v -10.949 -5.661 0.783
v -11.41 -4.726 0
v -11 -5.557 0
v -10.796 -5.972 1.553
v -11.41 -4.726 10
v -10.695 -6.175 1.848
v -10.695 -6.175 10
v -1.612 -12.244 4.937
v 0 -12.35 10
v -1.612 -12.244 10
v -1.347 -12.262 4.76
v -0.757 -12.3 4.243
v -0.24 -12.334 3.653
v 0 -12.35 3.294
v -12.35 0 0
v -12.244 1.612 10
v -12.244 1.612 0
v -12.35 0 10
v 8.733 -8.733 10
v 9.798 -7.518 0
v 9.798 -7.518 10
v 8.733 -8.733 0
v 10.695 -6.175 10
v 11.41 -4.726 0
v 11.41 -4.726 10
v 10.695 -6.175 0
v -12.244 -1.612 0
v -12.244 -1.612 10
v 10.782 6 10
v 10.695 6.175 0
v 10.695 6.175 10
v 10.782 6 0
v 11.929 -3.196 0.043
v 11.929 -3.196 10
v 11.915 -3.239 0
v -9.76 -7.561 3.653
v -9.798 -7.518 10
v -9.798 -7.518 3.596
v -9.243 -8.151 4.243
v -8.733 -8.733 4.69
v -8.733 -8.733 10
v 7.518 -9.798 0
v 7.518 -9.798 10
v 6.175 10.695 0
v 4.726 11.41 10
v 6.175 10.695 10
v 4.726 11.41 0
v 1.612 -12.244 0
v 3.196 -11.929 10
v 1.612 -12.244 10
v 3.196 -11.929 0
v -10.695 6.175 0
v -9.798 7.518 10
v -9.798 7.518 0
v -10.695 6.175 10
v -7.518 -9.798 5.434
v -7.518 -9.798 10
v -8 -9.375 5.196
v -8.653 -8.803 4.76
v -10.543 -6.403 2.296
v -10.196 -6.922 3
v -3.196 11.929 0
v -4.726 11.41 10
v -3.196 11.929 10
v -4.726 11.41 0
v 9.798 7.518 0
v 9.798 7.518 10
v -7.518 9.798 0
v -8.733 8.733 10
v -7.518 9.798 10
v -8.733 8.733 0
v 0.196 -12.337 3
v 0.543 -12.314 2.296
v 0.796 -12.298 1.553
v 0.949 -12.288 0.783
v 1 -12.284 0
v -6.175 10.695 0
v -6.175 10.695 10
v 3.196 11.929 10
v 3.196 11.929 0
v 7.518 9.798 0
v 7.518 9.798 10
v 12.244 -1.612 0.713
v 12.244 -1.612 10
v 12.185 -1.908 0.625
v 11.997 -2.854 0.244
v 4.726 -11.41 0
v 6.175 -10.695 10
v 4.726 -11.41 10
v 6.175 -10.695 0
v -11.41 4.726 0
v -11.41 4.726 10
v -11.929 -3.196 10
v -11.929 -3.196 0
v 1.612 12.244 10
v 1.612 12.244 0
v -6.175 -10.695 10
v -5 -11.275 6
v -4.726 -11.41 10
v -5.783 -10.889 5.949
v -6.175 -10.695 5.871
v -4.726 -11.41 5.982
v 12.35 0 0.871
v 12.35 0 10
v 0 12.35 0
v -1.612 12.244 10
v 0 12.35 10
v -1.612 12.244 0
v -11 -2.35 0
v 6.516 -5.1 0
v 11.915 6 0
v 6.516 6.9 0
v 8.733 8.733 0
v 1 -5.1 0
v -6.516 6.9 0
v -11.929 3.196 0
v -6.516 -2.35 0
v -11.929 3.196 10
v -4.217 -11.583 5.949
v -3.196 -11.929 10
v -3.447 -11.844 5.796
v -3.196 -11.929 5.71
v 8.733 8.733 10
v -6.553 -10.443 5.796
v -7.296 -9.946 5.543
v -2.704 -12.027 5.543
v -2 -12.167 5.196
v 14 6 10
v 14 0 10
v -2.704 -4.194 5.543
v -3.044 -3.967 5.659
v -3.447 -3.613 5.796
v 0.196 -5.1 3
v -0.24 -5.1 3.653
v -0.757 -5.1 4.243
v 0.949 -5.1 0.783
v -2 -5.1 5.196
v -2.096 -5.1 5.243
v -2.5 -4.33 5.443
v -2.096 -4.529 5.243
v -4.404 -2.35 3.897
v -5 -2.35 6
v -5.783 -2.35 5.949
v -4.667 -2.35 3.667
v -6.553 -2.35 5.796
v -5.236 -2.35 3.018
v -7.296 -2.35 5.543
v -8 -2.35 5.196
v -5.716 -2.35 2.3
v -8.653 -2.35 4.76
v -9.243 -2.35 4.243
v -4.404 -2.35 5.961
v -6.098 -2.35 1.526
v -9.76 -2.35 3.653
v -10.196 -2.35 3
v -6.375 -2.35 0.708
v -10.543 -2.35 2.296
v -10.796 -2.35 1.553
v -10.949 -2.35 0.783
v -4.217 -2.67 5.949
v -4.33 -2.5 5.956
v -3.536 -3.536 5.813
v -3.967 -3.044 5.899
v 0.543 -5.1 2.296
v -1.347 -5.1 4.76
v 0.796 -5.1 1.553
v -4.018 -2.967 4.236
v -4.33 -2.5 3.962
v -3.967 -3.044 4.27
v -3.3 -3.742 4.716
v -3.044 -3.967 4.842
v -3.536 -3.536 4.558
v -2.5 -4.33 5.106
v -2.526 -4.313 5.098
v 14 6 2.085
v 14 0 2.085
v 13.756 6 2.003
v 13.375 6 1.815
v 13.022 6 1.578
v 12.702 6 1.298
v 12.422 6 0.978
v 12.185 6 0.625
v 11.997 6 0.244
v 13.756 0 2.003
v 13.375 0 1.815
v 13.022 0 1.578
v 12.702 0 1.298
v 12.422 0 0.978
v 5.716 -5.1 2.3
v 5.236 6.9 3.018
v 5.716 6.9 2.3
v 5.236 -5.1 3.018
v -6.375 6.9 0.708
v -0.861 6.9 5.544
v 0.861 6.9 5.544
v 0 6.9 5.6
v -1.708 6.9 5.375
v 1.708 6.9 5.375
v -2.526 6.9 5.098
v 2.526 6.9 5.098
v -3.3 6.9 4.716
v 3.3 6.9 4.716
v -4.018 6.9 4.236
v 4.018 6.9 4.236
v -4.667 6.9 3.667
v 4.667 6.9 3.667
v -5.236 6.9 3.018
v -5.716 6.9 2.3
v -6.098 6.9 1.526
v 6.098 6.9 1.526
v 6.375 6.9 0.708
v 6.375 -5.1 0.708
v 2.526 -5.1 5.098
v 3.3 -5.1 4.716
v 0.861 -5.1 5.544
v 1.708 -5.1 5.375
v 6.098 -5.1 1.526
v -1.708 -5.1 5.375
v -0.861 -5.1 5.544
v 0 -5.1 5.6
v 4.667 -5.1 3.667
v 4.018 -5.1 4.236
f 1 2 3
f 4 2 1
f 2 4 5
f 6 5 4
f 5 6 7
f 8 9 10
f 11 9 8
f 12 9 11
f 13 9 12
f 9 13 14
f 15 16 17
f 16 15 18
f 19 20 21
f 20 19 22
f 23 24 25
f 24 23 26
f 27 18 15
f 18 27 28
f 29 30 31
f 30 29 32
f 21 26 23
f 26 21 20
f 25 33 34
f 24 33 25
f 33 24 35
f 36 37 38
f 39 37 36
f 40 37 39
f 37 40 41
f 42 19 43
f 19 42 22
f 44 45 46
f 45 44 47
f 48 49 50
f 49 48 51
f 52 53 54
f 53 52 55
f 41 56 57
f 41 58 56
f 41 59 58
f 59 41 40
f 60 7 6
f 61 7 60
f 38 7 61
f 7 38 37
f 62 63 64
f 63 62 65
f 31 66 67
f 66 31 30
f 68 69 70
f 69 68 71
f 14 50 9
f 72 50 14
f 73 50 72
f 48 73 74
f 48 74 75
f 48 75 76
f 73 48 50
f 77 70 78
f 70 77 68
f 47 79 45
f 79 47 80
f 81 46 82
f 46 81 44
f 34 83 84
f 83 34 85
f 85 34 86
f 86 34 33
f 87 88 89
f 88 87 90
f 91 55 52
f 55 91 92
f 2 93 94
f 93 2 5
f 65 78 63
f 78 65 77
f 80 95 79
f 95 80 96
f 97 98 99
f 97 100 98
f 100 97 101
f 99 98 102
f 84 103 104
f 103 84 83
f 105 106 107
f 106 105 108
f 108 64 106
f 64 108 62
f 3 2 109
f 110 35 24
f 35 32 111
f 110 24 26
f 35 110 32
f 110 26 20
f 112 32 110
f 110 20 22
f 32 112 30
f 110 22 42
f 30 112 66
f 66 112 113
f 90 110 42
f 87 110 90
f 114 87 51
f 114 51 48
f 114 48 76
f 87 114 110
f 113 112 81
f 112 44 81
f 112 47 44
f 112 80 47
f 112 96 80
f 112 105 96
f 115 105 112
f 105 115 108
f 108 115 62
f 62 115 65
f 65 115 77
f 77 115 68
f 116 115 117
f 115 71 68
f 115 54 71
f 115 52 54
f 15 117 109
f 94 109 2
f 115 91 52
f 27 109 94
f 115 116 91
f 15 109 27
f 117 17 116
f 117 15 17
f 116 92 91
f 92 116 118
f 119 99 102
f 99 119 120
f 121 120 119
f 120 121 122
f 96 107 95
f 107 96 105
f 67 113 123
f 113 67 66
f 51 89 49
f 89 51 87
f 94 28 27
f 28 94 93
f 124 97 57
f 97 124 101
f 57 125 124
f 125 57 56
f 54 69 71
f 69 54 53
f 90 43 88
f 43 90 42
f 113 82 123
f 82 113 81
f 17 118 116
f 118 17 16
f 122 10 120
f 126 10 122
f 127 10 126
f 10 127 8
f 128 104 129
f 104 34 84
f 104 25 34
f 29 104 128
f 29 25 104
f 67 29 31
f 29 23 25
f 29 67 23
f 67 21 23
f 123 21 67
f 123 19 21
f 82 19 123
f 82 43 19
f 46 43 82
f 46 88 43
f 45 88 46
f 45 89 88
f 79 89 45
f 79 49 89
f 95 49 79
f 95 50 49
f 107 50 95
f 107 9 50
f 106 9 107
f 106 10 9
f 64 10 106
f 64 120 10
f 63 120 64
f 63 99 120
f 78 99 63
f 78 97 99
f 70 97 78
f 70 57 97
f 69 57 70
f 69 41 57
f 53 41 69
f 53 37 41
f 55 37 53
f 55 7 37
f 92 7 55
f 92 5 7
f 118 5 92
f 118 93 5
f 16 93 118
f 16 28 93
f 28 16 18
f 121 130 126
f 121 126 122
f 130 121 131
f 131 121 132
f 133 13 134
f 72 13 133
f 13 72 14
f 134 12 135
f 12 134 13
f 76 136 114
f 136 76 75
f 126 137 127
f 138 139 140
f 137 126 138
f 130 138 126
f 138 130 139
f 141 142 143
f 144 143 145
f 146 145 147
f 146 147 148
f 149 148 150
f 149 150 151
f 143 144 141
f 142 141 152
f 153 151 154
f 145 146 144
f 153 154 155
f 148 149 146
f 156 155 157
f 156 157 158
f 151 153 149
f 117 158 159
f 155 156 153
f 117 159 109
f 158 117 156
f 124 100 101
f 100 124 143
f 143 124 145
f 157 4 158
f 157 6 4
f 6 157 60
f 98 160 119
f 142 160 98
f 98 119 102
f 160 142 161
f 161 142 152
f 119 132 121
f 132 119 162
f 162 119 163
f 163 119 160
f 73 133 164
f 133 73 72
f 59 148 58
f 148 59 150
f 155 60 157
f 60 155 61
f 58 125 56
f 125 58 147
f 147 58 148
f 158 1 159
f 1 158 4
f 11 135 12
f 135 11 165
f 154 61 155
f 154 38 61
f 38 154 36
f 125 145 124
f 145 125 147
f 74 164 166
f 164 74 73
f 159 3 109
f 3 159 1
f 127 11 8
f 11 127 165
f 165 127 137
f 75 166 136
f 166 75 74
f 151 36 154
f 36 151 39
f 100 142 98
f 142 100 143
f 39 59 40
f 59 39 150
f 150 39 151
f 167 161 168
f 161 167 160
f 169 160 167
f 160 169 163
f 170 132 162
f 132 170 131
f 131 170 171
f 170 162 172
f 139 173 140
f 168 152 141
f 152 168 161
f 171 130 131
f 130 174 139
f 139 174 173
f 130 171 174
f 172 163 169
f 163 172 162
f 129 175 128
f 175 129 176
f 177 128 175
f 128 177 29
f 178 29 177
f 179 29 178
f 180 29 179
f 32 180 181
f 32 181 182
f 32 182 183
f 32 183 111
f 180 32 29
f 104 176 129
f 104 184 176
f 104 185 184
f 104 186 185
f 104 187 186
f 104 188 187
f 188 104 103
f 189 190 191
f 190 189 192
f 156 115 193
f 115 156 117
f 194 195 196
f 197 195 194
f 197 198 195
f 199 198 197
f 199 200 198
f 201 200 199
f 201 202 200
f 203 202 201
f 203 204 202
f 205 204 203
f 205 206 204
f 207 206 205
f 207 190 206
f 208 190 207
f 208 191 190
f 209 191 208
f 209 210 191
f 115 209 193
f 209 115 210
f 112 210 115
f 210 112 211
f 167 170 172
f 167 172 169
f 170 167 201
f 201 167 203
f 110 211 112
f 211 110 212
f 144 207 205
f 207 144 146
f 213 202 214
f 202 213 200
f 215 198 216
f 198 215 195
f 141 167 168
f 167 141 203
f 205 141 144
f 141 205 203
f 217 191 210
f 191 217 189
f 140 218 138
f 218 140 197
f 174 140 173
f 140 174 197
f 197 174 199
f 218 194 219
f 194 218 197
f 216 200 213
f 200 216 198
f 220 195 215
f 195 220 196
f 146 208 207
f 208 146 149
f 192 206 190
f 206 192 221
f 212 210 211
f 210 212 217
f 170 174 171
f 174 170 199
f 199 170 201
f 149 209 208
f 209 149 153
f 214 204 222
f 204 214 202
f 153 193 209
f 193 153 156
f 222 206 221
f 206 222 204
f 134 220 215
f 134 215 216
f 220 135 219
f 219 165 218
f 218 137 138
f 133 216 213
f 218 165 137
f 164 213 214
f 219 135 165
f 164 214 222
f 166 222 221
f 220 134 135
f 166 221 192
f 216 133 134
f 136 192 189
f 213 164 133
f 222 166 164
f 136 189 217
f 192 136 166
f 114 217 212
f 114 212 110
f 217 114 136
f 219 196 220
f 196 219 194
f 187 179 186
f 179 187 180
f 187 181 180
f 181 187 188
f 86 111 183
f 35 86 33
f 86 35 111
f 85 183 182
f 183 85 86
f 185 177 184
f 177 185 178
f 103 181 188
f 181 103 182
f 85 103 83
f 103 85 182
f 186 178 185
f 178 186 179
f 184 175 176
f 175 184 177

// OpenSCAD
// Stand-off clip - a ring that snaps onto a round stand rod, with a separate ring for a
// piece of tubing, joined by a bridge. Printed flat (an extruded 2-D profile): the two rings
// do not touch the bed until they are assembled onto a stand, so no flat spots are needed.
// NOVEL general part.
//

stand_d  = 12.7;
tube_d   = 6;
bridge_w = 6;
height   = 10;

$fn = 48;

ring_d = stand_d + 2 * 3;          // outer diameter of the stand ring
open   = 10;                       // opening in the stand ring (-X side)
g      = stand_d + 0.5;            // approach the stand with a clearance gap

open_t = 4.5;                      // opening in the tubing ring (+X side)

difference() {
    union() {
        ring(stand_d + 2 * 3, open, height);                 // stand ring
        ring(tube_d, open_t, height, t = 2, centre_x = 15);   // tubing ring
        translate([8, 0, 0]) cube([bridge_w, 6, height]);      // bridge
    }
    translate([0, -5.1, -1]) rotate([-90, 0, 0]) cylinder(h = height + 2, d = g);   // stand rod
    translate([15, -2.25 - 1, -1]) rotate([-90, 0, 0]) cylinder(h = height + 2, d = open_t + 2); // tubing opening
}

// Ring with a radial opening, for a round rod of diameter d. Outer diameter od, wall t,
// height h, opening cut out of the -X side. Centre x, y (the opening axis is the X axis).
module ring(d, open, h, t = 3, centre_x = 0) {
    od = d + 2 * t;
    difference() {
        cylinder(h = h, d = od);
        translate([centre_x - open / 2, -od / 2 - 1, 0]) rotate([-90, 0, 0]) translate([0, 0, -1])
            cylinder(h = h + 2, d = open + 2);
    }
}
